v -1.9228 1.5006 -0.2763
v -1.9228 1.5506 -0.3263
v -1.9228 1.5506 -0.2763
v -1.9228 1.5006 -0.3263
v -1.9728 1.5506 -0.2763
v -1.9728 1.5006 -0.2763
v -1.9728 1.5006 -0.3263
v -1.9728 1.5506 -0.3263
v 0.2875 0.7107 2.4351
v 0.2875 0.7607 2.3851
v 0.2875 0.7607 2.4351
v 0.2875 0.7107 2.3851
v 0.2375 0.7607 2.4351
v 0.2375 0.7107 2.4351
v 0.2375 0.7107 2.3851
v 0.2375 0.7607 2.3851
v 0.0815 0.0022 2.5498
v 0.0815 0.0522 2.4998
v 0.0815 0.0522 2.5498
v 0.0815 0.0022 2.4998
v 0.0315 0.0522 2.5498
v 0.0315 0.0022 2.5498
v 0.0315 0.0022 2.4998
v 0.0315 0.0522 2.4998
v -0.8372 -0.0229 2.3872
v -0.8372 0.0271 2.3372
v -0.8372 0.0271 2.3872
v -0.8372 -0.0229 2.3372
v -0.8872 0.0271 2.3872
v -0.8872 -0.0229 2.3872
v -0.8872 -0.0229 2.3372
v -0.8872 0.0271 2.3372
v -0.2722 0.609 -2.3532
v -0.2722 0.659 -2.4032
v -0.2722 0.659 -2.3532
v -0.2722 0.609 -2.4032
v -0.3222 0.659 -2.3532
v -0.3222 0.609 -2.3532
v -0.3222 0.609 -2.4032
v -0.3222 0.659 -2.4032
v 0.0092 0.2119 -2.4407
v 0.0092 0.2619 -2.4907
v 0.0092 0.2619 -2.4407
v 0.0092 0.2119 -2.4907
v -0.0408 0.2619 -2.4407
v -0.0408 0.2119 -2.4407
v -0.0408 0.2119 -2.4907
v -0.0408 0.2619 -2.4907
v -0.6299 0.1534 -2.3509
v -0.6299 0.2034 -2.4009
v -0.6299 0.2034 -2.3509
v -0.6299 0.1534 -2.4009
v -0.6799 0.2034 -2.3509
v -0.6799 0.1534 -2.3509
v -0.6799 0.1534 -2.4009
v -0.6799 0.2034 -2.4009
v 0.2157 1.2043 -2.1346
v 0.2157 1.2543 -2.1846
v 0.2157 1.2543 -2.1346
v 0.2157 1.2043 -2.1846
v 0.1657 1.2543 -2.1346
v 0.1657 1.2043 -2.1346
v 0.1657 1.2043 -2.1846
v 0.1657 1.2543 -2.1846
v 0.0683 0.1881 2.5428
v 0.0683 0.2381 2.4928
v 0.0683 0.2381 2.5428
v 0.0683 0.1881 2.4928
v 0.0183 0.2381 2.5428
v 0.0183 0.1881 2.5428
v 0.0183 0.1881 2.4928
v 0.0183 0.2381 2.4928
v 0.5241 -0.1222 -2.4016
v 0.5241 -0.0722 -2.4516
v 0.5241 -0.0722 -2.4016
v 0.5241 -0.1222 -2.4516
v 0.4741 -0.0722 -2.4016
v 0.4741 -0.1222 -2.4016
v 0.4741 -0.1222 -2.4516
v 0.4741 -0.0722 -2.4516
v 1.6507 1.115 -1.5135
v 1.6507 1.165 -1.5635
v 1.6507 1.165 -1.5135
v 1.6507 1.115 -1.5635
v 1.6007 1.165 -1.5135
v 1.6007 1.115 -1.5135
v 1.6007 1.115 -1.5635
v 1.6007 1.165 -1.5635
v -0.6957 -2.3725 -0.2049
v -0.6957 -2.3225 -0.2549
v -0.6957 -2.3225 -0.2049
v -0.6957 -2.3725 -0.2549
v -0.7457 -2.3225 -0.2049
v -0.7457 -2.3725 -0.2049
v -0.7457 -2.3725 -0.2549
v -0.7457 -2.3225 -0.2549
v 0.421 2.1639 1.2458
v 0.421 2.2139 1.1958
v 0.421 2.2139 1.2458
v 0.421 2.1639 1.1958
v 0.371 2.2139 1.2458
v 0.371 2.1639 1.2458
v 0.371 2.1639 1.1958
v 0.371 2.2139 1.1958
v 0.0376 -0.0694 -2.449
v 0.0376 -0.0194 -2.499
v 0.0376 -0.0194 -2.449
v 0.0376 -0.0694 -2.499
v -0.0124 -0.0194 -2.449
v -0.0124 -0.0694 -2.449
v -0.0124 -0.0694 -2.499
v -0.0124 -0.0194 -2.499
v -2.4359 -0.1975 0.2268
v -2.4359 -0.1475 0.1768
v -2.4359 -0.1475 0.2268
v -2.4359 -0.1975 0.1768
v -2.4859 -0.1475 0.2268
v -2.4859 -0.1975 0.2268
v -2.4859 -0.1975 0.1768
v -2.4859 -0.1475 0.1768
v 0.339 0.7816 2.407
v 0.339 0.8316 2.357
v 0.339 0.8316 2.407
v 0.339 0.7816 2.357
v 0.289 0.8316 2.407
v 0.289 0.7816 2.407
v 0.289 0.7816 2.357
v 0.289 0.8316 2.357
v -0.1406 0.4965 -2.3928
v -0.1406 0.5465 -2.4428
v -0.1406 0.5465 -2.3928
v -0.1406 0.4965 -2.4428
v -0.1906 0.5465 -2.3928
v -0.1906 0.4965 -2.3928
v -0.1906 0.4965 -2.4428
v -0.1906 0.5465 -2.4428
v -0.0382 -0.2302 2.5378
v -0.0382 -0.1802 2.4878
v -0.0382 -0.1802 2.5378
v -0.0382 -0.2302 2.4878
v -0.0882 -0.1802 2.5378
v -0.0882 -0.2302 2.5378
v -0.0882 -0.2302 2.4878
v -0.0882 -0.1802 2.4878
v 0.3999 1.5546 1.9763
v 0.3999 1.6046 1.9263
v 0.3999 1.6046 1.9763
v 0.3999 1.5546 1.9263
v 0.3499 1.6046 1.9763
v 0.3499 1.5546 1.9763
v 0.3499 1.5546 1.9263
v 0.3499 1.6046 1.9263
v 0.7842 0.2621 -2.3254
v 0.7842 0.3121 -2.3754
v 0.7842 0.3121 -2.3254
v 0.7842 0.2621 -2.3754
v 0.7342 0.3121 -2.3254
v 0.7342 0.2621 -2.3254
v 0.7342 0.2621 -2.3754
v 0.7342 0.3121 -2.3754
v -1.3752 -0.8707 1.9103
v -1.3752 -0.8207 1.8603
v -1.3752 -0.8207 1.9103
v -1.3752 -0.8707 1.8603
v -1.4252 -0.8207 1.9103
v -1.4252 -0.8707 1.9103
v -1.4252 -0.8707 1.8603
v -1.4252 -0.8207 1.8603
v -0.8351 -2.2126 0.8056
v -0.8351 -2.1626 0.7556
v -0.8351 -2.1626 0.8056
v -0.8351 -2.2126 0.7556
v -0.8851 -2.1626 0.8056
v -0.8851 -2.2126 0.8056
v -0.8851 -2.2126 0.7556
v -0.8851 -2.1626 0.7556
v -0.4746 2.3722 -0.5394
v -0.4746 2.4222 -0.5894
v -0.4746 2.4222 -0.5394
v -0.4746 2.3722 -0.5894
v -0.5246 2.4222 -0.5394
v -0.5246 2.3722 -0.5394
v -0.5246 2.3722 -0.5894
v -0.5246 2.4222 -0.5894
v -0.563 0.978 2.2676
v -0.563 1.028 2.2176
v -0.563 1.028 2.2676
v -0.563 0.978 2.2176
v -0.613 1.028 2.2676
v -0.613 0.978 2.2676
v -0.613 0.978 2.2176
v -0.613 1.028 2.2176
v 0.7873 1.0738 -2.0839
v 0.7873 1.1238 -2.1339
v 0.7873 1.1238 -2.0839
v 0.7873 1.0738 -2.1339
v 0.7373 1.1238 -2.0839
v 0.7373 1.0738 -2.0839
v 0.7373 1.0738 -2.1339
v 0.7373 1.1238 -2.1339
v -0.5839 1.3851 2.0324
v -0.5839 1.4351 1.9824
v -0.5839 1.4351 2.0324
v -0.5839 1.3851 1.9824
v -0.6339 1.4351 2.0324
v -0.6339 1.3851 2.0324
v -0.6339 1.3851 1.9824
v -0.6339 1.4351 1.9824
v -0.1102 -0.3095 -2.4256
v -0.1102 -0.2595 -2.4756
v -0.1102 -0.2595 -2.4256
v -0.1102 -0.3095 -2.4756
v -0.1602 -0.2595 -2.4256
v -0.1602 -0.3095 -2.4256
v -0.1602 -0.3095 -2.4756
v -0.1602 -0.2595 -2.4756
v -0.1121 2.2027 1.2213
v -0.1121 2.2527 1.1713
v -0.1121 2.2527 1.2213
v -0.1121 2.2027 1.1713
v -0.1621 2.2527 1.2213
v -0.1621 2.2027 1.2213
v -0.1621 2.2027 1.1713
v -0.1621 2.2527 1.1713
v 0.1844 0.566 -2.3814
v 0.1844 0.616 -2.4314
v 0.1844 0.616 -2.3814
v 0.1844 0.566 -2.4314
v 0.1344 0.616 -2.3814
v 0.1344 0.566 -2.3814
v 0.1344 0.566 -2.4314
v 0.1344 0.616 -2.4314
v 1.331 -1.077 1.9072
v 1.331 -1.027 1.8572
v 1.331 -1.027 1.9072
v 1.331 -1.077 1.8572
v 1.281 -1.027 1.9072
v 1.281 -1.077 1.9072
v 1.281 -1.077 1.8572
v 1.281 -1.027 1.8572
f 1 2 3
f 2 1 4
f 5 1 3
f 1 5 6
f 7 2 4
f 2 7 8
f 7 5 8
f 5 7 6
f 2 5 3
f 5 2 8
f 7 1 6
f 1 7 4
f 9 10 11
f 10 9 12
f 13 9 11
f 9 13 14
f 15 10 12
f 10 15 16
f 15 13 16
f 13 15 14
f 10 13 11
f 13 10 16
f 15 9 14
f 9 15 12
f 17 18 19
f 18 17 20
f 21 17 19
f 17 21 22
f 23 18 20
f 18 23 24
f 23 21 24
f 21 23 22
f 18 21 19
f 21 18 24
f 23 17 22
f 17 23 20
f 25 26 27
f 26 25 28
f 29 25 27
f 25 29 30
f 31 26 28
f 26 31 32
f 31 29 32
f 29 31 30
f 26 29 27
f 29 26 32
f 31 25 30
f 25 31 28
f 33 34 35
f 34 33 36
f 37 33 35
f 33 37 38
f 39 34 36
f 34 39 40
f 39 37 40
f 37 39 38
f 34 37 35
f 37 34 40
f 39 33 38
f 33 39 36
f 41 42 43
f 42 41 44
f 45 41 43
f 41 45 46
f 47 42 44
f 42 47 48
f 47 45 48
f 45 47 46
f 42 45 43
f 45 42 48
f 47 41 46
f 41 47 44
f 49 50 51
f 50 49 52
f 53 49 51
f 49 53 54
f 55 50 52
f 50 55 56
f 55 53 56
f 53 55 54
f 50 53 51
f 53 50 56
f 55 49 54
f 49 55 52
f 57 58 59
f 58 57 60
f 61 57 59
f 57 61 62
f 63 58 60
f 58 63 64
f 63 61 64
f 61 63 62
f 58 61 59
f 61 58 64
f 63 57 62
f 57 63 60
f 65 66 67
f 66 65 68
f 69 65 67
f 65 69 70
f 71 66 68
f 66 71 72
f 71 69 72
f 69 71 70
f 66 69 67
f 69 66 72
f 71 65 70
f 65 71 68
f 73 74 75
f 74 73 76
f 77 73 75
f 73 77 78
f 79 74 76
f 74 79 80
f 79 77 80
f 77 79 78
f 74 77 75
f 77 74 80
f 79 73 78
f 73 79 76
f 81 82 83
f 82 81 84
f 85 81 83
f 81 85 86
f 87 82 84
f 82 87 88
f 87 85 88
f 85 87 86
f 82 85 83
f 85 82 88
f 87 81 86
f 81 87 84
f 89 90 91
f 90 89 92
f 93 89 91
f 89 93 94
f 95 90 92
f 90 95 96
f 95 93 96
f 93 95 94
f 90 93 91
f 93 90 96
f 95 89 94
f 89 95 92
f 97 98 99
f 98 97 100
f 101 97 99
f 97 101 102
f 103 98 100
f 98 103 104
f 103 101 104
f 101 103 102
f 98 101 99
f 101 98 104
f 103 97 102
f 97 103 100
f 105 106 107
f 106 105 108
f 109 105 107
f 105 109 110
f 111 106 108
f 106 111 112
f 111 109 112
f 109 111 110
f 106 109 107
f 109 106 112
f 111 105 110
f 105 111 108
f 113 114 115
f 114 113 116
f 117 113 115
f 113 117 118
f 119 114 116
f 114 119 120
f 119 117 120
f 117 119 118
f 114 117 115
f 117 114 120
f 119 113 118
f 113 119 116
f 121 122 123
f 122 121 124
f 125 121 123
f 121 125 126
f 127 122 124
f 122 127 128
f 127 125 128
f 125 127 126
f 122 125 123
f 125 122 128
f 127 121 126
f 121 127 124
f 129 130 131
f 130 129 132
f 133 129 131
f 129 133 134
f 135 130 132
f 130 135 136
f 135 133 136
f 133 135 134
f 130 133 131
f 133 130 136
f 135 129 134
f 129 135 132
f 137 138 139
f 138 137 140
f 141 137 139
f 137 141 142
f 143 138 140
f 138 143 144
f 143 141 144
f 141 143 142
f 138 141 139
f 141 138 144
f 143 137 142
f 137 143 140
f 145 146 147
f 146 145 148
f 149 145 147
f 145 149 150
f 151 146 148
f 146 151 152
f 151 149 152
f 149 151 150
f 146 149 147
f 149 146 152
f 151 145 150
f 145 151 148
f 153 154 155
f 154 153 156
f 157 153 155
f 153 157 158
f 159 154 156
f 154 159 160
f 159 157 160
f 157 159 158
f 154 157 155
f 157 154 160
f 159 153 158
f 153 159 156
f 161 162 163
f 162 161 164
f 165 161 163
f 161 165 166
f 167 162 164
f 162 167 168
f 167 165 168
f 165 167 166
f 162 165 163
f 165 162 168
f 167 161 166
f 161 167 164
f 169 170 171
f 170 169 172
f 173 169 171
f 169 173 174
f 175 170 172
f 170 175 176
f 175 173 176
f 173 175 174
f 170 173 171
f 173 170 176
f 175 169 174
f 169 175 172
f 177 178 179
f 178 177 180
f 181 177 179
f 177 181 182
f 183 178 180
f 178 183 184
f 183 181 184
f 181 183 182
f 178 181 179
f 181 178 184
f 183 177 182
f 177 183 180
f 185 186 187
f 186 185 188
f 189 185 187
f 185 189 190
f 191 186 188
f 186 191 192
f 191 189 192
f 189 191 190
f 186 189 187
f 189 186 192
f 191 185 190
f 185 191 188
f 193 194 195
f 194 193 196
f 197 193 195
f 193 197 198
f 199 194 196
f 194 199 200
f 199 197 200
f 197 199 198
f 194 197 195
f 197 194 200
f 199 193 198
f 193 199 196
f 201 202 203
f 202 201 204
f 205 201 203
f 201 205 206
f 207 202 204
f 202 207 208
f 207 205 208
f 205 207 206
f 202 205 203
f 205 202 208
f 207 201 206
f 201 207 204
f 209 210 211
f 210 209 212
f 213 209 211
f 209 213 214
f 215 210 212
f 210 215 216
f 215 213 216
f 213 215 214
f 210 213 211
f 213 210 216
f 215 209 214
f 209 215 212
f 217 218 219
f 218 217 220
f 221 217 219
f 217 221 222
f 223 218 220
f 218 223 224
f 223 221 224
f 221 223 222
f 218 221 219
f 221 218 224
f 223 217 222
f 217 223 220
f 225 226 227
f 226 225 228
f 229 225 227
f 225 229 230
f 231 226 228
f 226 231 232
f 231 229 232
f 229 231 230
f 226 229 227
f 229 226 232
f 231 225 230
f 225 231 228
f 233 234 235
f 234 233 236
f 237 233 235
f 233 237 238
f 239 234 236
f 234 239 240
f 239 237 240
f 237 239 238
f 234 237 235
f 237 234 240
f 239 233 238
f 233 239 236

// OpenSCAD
// file: point-generation.scad
/* 
Point-generation.scad
library for generating points lying on a surface either in regular grids or in a pseudo-random configuration.
 */

include <xyz-sphere-transform.scad>;
include <list-plot.scad>;

// random_sphere_point() generates a pseudo-random point lying on a sphere of non-random radius "r"
function random_sphere_point(r=1) = xyz_from_sphere_degrees(r,theta=rands(0,180,1)[0],phi=rands(0,360,1)[0]);

// randomSpherePoints() generates "n" pseudo-random points lying on a sphere of "r" radius
function random_sphere_points(n=1, r=1) = [for(i=[1:1:n]) random_sphere_point(r)];

// canonical_order_faces() generates a set of vectors defining triangular faces from a set of 3D points that is based on the canonical order of those points. Not currently useful, just a test of creating polyhedron faces from sample data in a generative fashion.
function canonical_order_faces(points) = [for(i = [0:1:len(points)-2]) [i, i+1, i+2]];

// example code - generate 1000 points on a sphere of radius 5. generate triangular connected polyhedron faces from the canonical order of these points.

// samplePoints = random_sphere_points(n=9999, r=5);
// list_plot3D(samplePoints, cube_size=0.05);
//polyhedron(points = samplePoints, faces = canonical_order_faces(samplePoints));
// file: list-plot.scad
/*
list-plot.scad
library defining functions for plotting lists of points.

future work - create a listplot function for points in 2D (x,y) since some openSCAD primitives only work with 2D coordinates.

*/

// plot a set of 3D points using cubes of adustable sidelength
module list_plot3D(points,cube_size=0.01){
    for(i = [0:1:len(points)-1]) {translate(points[i]) cube(cube_size);}
}
// file: xyz-sphere-transform.scad
/*
xyz-sphere-transform.scad
library defining functions for coordinate transformations from spherical (r, theta, phi) to cartesian (x,y,z)
*/

// reverse the canonical order of elements in a vector
function reverse_order(vector) = [for(i=[0:1:len(vector)-1]) vector[len(vector)-i-1]];

// Pi defined to a few more digits of precision than what OpenSCAD does natively as the specially defined variable PI.
// PI() is a function rather than a constant since I may substitute the hard constant with an actual algorithm to calculate PI to n-digits of precision later.
function PI() = 3.141592653589793;

// conversion functions for radians & degrees since I may need to do math in radians later
function degrees_to_radians(degrees=0) = (degrees/360)*2*PI();
function radians_to_degrees(radians=0) = (radians/(2*PI()))*360;

// Spherical (r,theta,phi) to Cartesian (x,y,z) coordinate transformation
// source: Mathematical Methods for Scientists and Engineers - Donald A. McQuarrie

// x = r*cos(phi)*sin(theta)     
// y = r*sin(phi)*sin(theta)     
// z = r*cos(theta)              
//
// 0 <= r     <   infinity
// 0 <= theta <=  Pi (180 degrees)
// 0 <= phi   <=  2*Pi (360 degrees)

// *_sphere_degrees functions take angle arguments in degrees
function x_sphere_degrees(r=1,theta=0,phi=0) = r*cos(phi)*sin(theta); 
function y_sphere_degrees(r=1,theta=0,phi=0) = r*sin(phi)*sin(theta); 
function z_sphere_degrees(r=1,theta=0) = r*cos(theta);
function xyz_from_sphere_degrees(r=1,theta=0,phi=0) = [x_sphere_degrees(r,theta,phi), y_sphere_degrees(r,theta,phi), z_sphere_degrees(r,theta)];

// *_sphere_radians functions take angle arguments in radians and convert to degrees - since OpenSCAD's trig functions only take angle arguments as degrees
function x_sphere_radians(r=1,theta=0,phi=0) = x_sphere_degrees(r,radians_to_degrees(theta),radians_to_degrees(phi));
function y_sphere_radians(r=1,theta=0,phi=0) = y_sphere_degrees(r,radians_to_degrees(theta),radians_to_degrees(phi));
function z_sphere_radians(r=1,theta=0) = z_sphere_degrees(r,radians_to_degrees(theta));
function xyz_from_sphere_radians(r=1,theta=0,phi=0) = [x_sphere_radians(r,theta,phi), y_sphere_radians(r,theta,phi), z_sphere_radians(r,theta)];

//------------------------------------------------------------------------------------------
// Test code for creating an evenly spaced set of points in a spherical coordinate system. 
//
//theta_range = [0,1,30];
//phi_range = [0,3,90];
//
//theta_index = [for(i = [theta_range[0]:theta_range[1]:theta_range[2]]) i];
//phi_index = [for(i = [phi_range[0]:phi_range[1]:phi_range[2]]) i];
//
//surfacePoints = [for(theta = theta_index, phi=phi_index) [x_sphere_degrees(1,theta,phi),y_sphere_degrees(1,theta,phi),z_sphere_degrees(1,theta)]];
//
//slice1 = [for(i = [0:len(theta_index):len(theta_index)*len(phi_index)]) surfacePoints[i]];
//slice2 = reverse_order([for(i = [0:len(theta_index):len(theta_index)*len(phi_index)]) surfacePoints[i+1]]);
//
// Plot of surface points that were evenly generated over a sphere using the theta, phi indices
//color("green")
//for(i = [0:1:len(surfacePoints)-1]) {translate(surfacePoints[i]) cube(0.001);}
//
//color("green")
//list_plot3D(slice1,0.01);
// main file
/*
nearest-neighbor.scad
Defines functions related to a nearest-neighbor-search algorithm for finding points that are closest each other in a given space.

Should be useful for generatively defining in a set of points which elements form polyhedral faces on a smooth, well defined 3D surface even if the spacing of the points is not regular.

https://en.wikipedia.org/wiki/Nearest_neighbor_search

NNS can be done in n-dimensions. In the case of a set of 3D points, the problem is simpler since we only have 3 dimensions in a metric space, and therefore can use distance in the traditional sense as the "closeness" test.

The naive approach would be to compute the distance of every point in the set "S" relative to the query point "q", however the computation time can be reduced if you structure the data so as to re-use previously calculated results.


Fixed-radius NNS
https://en.wikipedia.org/wiki/Fixed-radius_near_neighbors
One approach that reduces computation time is the special case of the NNS with a defined maximum radius "delta".
A grid is constructed in cartesian space with unit cubes of sidelength delta, and each point in the set "S" is categorized according to which unit cube it exists in within this grid.

This reduces the search time since finding the nearest "k"-neighbors of the query point "q" means only having to check the unit cube it exists in, and the adjoining unit cubes, and then computing the norm between "q" and the neighbors within those cubes.

*/

include <xyz-sphere-transform.scad>;
include <list-plot.scad>;
include <point-generation.scad>;

// distance_3D(a,b) calculates the absolute distance between the two 3D points "a" and "b"
function distance3D(a,b) = norm(a-b);

// point_set_distances3D(point_set) is a naive calculation of distances between points. 
// This approach does not attempt to prevent calculating the distance between a point and itself. 
// It also doesn't reduce the set to a minimal size by not re-calculating a given result - e.g. distance3D(a, b) and distance3D(b,a) which are equivalent.
// For a set of 3 points, an efficient algorithm would only produce a set of results with three vectors, whereas this one produces nine.
function point_set_distances3D(point_set) = [for(i=[0:1:len(point_set)-1], j=[0:1:len(point_set)-1]) [i, j, distance3D(point_set[i],point_set[j])]];

// test code
samplePoints = random_sphere_points(n=30,r=2.5);
list_plot3D(samplePoints, cube_size=0.05);

dist = point_set_distances3D(samplePoints);
//echo(dist);


// let's visually create the delta-unit grid with transparent cubes so that it is easy to check if grouping is working correctly.

delta=1;

// construct a grid of cubes of with sidelength delta that contains all points generated in samplePoints. For a sphere of sufficient radius and small enough delta, this would mean a lot of cubes in the center would be empty of points. May want to see if it's possible to exclude generation of cubes in the grid that are known to be empty, and optimize the search algorithm to only look at occupied cubes.
// for now, let's use a naive algorithm that just checks for the maximum dimension in any x,y,z coordinate over the set of samplePoints and use a grid over the cubic space of that.


samplePoints_norm = [for(i=[0:1:len(samplePoints)-1]) norm(samplePoints[i])];
max_norm = max(samplePoints_norm);
num_container_boxes = ceil(max_norm/delta);

function box_centers(delta) = [for(i=[-num_container_boxes:delta:num_container_boxes], j=[-num_container_boxes:delta:num_container_boxes], k=[-num_container_boxes:delta:num_container_boxes] ) [i, j, k]];

boxes = box_centers(delta);

module transparent_cube_grid(delta){
    for(i=[0:1:len(boxes)-1]) translate(boxes[i])%cube(delta,center=true);
}


echo(samplePoints);
echo(num_container_boxes);
echo(len(boxes));
transparent_cube_grid(delta);


//function fixed_radius_grid(point_set, delta) =  
